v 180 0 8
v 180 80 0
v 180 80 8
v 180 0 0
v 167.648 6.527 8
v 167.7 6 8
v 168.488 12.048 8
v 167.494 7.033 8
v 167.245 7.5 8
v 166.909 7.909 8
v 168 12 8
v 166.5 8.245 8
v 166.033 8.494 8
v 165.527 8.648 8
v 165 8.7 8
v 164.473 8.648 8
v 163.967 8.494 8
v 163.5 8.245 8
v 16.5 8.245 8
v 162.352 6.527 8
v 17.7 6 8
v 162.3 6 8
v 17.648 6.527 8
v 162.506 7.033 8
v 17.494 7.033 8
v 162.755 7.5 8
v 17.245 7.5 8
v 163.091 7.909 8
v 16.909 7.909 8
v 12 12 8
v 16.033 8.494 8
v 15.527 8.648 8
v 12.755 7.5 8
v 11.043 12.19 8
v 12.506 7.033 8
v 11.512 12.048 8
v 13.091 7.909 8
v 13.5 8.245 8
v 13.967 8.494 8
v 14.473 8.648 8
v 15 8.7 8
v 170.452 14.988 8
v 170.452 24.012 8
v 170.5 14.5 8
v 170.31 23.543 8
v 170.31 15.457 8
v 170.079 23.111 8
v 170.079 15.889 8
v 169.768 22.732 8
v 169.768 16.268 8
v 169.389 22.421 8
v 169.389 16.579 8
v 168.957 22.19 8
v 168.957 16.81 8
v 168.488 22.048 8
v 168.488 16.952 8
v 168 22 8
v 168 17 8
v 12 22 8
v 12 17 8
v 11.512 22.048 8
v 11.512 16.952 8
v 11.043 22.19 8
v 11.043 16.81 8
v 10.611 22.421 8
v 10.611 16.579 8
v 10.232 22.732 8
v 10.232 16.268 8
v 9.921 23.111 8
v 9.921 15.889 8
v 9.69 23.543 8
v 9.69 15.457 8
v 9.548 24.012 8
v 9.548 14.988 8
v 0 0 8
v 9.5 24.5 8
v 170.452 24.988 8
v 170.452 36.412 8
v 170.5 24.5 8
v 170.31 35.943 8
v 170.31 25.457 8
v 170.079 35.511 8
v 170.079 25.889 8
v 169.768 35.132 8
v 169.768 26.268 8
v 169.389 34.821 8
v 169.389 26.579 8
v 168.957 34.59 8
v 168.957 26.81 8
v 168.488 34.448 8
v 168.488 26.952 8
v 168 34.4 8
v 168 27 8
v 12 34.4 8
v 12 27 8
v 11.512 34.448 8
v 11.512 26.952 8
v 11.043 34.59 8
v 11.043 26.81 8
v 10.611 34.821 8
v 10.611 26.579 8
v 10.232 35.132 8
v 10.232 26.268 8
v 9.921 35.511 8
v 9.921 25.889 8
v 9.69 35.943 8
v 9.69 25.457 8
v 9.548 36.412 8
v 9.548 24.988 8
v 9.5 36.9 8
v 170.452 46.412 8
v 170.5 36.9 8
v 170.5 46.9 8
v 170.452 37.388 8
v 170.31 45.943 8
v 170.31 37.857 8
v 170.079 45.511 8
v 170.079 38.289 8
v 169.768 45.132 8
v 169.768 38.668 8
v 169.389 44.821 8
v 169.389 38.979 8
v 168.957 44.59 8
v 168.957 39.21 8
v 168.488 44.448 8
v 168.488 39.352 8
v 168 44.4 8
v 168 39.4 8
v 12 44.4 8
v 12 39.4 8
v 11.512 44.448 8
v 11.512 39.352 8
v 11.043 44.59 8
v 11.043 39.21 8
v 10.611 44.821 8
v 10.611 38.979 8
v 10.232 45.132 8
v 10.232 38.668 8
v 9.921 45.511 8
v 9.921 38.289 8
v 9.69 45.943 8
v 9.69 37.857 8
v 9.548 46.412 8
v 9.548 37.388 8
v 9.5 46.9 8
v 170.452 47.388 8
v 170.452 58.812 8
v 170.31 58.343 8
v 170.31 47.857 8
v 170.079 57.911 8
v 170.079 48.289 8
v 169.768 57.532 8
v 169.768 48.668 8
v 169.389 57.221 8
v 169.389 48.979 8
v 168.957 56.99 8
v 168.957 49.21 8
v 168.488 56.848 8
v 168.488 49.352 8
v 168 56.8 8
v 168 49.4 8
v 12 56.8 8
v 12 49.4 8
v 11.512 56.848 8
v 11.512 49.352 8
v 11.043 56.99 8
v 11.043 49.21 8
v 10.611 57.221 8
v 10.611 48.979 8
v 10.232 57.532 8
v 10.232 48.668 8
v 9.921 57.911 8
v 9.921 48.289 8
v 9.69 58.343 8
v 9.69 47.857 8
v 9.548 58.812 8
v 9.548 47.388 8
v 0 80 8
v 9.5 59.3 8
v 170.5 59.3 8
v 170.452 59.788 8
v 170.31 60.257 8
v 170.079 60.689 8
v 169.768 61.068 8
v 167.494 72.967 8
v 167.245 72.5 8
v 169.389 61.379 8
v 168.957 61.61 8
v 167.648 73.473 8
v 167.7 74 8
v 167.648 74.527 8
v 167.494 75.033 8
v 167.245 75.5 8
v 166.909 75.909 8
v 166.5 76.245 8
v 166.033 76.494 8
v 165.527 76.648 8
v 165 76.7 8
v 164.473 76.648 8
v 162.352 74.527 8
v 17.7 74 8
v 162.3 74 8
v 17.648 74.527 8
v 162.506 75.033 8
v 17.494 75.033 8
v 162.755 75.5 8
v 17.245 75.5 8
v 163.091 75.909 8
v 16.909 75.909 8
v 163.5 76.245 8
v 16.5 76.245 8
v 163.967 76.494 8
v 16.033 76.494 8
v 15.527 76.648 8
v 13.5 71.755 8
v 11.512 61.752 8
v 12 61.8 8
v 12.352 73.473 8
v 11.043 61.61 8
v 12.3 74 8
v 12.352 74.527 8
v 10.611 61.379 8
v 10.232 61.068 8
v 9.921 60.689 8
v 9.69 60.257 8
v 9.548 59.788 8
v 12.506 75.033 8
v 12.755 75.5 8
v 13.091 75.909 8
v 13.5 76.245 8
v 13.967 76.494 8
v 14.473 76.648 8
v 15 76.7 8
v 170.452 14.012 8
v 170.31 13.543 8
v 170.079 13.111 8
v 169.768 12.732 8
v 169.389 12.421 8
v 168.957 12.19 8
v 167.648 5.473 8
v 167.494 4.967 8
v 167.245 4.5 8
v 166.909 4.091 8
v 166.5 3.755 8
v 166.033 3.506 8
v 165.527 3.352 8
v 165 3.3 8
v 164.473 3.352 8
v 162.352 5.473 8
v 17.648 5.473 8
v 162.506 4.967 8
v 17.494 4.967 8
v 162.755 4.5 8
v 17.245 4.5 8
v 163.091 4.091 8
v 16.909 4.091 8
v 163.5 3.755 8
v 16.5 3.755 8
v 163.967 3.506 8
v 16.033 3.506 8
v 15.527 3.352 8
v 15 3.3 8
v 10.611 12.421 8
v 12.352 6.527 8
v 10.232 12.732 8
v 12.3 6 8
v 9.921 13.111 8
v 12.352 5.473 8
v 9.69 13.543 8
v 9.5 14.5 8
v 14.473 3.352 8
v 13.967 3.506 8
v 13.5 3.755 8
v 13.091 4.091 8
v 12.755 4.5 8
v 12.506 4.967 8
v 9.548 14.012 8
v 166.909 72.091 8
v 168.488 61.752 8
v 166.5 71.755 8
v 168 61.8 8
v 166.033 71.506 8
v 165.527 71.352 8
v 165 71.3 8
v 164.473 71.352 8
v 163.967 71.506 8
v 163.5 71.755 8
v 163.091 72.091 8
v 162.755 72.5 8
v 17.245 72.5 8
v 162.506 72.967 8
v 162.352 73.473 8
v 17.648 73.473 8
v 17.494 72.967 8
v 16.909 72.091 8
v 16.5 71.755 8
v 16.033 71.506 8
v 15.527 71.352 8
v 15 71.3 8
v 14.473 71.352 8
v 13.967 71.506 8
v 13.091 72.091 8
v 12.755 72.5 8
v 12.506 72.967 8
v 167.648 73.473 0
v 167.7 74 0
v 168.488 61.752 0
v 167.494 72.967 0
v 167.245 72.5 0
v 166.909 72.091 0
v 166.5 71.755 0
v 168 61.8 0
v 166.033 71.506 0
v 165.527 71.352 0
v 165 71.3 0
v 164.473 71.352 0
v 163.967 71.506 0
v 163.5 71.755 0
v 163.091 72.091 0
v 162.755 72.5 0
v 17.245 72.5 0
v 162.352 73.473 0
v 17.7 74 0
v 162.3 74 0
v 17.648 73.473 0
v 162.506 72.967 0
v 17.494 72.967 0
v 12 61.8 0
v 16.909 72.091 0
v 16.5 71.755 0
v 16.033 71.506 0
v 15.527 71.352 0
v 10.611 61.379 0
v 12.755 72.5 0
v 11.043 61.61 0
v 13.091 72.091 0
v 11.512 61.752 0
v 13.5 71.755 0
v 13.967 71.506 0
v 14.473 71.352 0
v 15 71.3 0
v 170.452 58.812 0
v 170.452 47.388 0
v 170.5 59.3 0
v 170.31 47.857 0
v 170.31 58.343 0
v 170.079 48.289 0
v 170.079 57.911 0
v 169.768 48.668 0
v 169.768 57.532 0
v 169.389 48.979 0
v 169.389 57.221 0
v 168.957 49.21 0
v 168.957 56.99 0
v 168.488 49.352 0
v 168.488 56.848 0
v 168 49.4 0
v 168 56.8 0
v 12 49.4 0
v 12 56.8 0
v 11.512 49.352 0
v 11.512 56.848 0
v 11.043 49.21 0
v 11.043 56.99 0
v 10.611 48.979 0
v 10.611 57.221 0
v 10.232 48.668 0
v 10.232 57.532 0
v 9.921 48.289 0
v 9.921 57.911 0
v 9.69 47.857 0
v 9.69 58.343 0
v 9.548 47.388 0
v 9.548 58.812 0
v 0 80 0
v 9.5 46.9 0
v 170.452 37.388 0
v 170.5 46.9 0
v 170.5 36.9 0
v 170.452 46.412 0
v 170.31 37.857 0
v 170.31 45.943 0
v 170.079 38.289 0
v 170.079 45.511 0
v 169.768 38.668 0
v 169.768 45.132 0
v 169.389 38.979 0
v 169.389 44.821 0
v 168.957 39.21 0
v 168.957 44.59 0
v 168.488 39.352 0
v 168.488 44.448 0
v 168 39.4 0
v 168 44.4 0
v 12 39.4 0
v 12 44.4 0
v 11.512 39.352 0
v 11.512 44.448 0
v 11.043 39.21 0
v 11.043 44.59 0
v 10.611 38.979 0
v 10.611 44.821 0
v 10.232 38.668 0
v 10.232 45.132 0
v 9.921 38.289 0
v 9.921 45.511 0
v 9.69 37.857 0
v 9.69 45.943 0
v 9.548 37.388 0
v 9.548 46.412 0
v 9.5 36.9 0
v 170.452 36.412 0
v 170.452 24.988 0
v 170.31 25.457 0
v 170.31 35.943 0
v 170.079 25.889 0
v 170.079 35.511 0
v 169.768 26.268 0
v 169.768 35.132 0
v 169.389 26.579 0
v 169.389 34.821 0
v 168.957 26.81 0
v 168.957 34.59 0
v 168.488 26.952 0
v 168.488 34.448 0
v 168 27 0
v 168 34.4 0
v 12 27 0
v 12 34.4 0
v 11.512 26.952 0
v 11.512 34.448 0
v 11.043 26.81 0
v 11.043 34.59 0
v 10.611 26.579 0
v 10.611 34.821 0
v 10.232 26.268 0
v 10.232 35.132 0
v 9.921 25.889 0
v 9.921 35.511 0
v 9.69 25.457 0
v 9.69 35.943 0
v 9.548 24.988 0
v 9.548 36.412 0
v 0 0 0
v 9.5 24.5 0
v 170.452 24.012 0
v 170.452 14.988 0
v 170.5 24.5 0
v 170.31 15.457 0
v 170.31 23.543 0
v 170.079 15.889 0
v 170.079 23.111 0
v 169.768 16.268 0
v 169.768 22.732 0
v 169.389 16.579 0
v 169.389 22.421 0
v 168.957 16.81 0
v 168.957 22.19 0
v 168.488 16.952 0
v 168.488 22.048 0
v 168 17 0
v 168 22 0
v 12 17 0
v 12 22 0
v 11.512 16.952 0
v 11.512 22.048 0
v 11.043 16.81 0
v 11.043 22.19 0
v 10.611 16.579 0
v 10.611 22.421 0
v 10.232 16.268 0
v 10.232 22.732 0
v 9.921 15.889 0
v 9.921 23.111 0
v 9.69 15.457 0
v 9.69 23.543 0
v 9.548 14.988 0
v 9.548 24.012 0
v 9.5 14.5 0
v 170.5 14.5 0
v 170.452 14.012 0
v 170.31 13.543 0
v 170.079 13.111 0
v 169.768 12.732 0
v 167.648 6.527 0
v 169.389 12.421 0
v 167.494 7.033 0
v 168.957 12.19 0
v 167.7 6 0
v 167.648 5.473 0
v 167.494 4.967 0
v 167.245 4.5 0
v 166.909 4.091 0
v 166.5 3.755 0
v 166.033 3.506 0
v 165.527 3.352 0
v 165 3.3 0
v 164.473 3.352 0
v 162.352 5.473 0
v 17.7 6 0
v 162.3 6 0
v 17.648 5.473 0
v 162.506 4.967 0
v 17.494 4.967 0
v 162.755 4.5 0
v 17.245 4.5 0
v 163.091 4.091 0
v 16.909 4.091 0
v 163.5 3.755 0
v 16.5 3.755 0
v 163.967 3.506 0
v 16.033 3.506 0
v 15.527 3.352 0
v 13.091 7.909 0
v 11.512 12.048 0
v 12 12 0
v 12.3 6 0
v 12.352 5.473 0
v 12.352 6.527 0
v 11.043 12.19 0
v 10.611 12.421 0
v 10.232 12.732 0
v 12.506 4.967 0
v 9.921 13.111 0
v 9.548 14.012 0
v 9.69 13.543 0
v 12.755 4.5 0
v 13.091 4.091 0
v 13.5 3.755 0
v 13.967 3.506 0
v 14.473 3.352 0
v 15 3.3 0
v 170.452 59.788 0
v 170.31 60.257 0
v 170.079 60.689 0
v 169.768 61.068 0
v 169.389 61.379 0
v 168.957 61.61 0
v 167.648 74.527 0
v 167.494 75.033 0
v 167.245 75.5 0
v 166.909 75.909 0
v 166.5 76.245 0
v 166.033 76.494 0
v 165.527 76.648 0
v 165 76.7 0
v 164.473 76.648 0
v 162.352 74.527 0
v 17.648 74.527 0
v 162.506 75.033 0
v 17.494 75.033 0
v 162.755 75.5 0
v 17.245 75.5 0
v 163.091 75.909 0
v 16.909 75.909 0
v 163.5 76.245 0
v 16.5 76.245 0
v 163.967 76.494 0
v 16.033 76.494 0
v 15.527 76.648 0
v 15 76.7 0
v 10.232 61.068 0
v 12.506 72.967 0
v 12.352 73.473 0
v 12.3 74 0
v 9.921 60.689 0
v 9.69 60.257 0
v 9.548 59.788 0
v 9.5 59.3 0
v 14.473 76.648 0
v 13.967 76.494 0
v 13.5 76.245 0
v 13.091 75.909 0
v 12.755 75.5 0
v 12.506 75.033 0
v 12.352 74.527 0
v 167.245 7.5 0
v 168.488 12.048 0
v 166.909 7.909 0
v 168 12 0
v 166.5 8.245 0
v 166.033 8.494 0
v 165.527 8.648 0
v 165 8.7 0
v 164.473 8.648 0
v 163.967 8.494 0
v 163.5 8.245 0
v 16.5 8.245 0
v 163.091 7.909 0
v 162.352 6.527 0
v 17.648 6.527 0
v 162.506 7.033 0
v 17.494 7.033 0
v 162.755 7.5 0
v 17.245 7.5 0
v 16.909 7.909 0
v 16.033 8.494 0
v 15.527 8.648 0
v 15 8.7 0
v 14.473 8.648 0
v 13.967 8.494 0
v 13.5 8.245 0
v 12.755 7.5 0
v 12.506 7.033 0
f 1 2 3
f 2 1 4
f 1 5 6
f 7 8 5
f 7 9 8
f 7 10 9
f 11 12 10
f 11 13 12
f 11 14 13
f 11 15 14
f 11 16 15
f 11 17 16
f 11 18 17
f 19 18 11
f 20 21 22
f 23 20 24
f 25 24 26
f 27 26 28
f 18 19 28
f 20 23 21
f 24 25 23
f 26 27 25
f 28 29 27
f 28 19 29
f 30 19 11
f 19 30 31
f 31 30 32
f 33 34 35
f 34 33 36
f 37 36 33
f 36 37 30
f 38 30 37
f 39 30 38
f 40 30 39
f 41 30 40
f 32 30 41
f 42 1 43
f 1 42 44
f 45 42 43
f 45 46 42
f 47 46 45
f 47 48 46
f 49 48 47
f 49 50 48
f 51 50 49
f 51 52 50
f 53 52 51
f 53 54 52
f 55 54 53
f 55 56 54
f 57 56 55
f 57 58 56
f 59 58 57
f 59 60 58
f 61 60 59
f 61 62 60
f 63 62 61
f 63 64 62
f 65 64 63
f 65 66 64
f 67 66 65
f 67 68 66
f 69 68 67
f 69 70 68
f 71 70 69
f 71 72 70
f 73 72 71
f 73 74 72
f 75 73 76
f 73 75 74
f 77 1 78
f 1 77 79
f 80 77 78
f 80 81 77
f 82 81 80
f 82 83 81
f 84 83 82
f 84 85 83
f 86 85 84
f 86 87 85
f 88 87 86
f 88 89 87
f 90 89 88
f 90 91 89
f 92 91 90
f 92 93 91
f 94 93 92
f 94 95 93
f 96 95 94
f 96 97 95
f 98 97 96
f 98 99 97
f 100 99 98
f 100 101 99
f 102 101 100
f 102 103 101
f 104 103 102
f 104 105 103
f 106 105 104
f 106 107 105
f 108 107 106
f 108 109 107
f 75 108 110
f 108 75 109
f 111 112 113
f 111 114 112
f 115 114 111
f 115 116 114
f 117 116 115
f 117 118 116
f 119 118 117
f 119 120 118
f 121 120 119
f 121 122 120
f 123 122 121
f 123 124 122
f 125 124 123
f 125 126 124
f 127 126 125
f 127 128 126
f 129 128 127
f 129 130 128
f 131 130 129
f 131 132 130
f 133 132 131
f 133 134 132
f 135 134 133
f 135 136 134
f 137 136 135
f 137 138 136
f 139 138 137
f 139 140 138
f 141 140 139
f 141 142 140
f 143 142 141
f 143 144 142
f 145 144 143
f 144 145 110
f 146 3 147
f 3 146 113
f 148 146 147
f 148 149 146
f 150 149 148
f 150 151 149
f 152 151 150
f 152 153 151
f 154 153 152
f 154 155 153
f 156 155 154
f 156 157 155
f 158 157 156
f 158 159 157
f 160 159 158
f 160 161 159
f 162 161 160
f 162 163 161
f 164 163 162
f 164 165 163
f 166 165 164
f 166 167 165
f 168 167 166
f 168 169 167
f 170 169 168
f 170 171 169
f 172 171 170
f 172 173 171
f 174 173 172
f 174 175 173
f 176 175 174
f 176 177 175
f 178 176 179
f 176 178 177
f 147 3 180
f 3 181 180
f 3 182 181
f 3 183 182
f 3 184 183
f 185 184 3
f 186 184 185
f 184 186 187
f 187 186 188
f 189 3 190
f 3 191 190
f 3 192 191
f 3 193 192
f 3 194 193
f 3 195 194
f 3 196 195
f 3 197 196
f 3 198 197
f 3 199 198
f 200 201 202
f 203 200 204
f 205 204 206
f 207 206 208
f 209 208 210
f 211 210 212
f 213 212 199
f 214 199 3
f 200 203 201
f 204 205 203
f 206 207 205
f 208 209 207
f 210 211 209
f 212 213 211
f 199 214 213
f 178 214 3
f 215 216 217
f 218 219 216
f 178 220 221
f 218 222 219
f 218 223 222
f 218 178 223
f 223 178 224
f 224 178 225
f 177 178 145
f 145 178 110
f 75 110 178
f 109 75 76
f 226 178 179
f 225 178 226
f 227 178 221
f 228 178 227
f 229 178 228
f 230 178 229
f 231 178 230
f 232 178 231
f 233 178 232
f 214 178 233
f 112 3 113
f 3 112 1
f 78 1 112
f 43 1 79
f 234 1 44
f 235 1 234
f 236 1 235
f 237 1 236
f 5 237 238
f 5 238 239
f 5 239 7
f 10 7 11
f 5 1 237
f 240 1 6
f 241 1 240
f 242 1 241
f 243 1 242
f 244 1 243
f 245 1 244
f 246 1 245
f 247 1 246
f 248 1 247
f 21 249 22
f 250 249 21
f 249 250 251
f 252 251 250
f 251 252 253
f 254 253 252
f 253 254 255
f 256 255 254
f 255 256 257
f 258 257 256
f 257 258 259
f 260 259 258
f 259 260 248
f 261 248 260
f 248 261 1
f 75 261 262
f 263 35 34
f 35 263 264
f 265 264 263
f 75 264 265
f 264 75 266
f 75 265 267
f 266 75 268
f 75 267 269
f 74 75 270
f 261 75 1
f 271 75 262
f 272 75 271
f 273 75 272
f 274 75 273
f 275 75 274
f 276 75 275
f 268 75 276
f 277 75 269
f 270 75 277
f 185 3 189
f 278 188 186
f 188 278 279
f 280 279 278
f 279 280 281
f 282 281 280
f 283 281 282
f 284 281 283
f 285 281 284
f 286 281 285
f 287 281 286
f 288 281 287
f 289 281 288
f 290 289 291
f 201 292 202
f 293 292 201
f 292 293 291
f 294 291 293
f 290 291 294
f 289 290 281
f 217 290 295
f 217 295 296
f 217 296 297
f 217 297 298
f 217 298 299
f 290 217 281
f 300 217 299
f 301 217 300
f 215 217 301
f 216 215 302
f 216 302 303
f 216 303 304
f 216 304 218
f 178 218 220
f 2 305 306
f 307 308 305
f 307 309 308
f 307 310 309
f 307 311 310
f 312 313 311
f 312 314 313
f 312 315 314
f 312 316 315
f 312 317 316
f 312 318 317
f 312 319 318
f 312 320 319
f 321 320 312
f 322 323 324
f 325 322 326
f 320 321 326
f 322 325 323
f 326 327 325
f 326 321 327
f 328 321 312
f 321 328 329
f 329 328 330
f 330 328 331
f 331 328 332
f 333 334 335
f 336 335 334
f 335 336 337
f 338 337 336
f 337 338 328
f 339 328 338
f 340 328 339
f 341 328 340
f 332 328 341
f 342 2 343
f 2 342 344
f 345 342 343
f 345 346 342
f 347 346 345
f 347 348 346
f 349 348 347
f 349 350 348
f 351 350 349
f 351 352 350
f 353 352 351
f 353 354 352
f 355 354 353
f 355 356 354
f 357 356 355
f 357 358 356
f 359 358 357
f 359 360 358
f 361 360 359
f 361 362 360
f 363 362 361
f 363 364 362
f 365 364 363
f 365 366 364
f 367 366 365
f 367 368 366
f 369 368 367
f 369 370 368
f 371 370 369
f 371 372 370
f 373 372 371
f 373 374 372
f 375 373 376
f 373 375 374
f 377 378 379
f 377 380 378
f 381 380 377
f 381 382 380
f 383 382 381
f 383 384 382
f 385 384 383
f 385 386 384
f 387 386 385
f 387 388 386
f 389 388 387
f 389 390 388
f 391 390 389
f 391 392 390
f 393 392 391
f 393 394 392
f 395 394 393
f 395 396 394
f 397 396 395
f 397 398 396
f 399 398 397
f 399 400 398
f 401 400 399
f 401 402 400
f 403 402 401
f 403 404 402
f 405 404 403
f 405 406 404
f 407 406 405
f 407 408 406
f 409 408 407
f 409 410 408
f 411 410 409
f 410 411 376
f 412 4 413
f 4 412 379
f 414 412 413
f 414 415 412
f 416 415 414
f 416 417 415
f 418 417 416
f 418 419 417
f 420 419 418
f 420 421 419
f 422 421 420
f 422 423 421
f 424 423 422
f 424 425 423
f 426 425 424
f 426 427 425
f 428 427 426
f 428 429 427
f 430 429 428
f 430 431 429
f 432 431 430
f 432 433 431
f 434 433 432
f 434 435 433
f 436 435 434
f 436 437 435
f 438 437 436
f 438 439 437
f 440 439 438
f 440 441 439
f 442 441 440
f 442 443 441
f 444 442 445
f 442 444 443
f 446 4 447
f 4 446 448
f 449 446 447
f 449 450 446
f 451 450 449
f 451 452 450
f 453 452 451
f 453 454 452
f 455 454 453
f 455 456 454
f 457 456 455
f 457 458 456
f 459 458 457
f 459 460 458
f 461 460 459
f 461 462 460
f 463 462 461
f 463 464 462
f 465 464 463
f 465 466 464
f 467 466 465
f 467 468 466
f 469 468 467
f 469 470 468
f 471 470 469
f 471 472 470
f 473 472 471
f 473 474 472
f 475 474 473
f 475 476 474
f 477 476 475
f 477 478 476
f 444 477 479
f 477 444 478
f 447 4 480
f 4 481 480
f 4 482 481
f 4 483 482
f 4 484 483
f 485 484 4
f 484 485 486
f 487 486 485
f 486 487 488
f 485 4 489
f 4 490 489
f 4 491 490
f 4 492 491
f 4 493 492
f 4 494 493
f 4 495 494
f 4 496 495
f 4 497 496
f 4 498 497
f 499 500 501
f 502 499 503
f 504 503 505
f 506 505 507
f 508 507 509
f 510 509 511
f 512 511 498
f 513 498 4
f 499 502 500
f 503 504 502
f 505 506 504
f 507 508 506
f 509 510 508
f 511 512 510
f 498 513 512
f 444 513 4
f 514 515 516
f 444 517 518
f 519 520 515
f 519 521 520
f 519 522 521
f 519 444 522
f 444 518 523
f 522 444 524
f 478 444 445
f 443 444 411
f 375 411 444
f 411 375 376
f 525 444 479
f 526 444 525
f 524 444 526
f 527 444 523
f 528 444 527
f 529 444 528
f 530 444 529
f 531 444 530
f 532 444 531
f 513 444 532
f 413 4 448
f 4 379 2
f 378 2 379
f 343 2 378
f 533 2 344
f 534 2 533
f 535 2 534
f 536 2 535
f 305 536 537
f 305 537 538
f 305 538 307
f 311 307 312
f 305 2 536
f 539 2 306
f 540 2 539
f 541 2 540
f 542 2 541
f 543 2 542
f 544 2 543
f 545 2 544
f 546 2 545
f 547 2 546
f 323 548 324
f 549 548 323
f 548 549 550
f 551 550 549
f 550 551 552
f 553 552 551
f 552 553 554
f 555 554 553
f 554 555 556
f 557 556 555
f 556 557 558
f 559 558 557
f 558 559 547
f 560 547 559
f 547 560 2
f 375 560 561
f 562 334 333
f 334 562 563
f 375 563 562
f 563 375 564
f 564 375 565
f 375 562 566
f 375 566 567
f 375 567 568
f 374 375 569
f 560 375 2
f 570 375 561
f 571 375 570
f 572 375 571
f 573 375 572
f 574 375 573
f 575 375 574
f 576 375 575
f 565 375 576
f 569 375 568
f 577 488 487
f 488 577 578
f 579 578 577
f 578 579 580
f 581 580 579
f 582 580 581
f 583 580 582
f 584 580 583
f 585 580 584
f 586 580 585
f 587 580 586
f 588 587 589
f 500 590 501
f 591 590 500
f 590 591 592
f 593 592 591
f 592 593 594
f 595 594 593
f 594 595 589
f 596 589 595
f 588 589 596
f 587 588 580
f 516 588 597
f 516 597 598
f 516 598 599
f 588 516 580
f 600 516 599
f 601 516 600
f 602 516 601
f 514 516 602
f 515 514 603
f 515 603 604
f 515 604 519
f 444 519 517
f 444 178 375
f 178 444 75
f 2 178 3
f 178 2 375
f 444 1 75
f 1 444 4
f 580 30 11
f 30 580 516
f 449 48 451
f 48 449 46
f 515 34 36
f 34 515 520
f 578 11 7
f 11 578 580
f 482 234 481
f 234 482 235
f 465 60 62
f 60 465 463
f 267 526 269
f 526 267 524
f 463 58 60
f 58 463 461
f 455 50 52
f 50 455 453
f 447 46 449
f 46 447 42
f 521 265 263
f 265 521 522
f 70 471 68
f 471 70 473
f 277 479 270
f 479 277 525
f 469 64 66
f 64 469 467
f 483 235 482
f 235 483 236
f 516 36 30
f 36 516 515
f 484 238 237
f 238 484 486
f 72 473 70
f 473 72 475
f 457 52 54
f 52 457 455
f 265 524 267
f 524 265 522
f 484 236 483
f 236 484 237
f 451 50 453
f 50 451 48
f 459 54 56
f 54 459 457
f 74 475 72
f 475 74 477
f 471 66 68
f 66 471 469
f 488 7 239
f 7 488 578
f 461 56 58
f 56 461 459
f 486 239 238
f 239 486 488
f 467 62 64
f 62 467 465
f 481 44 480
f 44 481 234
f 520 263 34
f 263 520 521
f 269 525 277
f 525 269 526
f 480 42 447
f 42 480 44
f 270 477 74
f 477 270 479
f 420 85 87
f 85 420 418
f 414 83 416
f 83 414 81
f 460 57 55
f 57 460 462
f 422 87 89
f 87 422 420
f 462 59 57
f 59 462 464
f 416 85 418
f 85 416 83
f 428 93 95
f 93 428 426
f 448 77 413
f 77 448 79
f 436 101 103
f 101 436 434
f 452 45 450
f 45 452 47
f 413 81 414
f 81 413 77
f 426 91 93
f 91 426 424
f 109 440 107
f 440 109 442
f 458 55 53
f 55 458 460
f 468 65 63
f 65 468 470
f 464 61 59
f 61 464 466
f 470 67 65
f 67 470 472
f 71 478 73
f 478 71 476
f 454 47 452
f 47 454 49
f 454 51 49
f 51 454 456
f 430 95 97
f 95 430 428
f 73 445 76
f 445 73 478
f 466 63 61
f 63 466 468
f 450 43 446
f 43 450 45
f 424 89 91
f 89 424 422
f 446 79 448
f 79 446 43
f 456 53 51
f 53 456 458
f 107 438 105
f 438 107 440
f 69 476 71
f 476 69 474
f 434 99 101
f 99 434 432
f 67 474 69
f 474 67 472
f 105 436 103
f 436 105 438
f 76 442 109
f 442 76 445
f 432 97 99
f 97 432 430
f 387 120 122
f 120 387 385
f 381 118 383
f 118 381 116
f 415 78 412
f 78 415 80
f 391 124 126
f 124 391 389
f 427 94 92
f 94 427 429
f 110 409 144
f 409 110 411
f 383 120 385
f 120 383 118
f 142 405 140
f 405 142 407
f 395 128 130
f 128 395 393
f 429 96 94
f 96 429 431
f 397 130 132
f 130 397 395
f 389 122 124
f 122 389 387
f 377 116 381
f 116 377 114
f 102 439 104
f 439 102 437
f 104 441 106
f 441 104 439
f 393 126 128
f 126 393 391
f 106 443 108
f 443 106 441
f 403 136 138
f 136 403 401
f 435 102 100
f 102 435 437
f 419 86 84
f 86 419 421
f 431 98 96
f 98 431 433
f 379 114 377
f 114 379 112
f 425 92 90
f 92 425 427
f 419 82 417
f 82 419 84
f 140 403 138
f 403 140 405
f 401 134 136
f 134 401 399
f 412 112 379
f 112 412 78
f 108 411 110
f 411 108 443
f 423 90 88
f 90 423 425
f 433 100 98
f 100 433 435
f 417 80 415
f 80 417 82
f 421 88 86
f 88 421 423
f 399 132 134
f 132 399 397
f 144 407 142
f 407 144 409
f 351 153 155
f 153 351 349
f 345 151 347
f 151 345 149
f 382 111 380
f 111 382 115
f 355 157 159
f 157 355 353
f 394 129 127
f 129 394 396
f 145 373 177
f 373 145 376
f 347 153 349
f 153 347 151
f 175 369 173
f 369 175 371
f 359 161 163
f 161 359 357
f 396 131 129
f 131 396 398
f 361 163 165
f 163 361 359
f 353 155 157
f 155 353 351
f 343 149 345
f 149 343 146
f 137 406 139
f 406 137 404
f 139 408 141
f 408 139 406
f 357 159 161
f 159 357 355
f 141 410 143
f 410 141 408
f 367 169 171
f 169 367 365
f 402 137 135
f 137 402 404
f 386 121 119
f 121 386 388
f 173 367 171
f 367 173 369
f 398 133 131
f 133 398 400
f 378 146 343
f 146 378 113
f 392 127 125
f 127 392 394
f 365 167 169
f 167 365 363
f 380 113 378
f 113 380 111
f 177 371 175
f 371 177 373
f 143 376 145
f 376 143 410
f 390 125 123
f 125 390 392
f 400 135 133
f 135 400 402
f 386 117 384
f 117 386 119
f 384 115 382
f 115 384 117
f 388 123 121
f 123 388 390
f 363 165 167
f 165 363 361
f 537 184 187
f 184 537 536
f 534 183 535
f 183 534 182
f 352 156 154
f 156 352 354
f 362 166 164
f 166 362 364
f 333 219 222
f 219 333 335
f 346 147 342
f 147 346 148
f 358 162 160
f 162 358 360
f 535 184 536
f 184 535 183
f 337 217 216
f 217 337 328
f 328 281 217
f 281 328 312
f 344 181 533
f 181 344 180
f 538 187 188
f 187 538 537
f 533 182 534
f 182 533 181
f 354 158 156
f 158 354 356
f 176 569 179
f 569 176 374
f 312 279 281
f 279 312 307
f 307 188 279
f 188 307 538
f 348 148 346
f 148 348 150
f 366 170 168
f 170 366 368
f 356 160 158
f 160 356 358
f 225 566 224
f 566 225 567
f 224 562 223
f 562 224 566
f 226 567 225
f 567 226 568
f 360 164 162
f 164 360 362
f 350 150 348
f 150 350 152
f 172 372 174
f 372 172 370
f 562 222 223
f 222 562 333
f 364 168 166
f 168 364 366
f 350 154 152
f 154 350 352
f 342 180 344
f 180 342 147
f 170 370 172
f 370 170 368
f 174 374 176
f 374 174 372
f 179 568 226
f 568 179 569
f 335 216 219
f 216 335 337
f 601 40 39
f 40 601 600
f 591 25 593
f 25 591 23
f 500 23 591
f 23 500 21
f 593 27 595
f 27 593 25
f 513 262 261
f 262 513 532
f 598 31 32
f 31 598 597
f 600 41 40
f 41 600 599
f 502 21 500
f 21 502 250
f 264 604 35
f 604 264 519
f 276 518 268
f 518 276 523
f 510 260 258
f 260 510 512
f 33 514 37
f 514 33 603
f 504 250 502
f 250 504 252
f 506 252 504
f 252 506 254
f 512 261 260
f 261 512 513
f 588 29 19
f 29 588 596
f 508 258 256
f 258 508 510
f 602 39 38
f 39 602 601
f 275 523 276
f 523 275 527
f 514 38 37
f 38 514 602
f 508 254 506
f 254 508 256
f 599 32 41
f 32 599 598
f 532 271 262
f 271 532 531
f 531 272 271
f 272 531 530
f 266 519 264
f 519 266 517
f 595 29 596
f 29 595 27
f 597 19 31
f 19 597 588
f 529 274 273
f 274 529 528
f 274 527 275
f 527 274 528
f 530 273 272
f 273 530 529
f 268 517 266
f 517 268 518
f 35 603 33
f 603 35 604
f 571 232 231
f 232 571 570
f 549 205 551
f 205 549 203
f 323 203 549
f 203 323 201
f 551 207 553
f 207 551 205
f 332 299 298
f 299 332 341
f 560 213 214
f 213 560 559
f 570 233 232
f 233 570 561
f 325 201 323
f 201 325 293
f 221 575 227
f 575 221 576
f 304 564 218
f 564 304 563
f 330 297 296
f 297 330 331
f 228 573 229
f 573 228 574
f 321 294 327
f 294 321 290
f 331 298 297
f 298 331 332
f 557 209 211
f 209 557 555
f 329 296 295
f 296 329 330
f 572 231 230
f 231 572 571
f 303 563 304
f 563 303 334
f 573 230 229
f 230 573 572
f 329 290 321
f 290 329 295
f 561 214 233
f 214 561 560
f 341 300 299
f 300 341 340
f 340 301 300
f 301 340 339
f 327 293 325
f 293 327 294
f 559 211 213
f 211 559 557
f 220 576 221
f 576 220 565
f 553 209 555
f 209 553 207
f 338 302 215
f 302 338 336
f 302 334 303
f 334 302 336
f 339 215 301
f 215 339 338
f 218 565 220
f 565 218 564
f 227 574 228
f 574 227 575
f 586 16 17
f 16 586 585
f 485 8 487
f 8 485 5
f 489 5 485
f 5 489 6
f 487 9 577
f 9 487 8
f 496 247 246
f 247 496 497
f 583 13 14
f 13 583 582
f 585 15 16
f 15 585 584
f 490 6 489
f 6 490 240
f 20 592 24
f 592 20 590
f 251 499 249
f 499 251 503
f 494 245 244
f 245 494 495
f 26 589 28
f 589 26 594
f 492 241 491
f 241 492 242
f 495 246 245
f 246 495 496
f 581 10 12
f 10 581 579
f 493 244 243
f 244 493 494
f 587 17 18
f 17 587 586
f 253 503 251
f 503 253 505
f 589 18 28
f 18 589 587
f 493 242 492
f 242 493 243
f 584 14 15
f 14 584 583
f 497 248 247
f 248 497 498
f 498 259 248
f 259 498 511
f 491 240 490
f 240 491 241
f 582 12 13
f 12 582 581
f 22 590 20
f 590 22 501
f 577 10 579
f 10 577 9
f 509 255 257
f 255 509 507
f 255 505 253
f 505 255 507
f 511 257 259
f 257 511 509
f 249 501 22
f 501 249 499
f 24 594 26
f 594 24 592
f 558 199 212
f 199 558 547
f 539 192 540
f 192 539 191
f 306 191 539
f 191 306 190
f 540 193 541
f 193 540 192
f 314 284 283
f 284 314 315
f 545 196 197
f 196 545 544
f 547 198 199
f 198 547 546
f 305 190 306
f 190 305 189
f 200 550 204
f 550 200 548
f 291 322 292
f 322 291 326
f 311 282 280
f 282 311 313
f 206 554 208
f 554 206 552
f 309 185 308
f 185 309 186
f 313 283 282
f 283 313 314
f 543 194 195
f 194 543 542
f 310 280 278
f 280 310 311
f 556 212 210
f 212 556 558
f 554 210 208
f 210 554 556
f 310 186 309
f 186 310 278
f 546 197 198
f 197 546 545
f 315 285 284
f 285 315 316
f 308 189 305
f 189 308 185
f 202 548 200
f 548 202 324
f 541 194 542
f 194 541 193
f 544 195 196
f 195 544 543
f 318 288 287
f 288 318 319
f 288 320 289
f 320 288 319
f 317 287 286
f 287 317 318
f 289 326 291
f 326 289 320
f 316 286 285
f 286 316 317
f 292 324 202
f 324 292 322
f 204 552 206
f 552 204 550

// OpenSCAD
$fn = 32;

// ----------------------------------------------------------------------
// Slotted panel: 180 x 80 mm, 5 рядов of slots
// ----------------------------------------------------------------------

// --- parameters (mm) ---
panel_w = 180;            // panel width
panel_d = 80;             // panel depth
thick = 8;                // panel thickness
slot_w = 5;               // slot width
pitch0 = 10;              // first row pitch
pitch_step = 2.4;         // pitch increase per row
margin = 12;              // margin around the slot field
rows = 5;                 // number of slot rows
mount_d = 5.4;            // mounting holes
mount_x = 75;             // mounting hole offset

difference() {
  union() {
    cube([panel_w, panel_d, thick]);
  }
  /* slot rows: stadium shaped cutters, 2.5 mm clear of both faces */
  /* row 0: pitch 10, length 156 */
  hull() {
    translate([12, 14.5, -2.5]) cylinder(h = thick + 5, d = slot_w);
    translate([168, 14.5, -2.5]) cylinder(h = thick + 5, d = slot_w);
  }
  /* row 1: pitch 12.4, length 156 */
  hull() {
    translate([12, 24.5, -2.5]) cylinder(h = thick + 5, d = slot_w);
    translate([168, 24.5, -2.5]) cylinder(h = thick + 5, d = slot_w);
  }
  /* row 2: pitch 10, length 156 */
  hull() {
    translate([12, 36.9, -2.5]) cylinder(h = thick + 5, d = slot_w);
    translate([168, 36.9, -2.5]) cylinder(h = thick + 5, d = slot_w);
  }
  /* row 3: pitch 12.4, length 156 */
  hull() {
    translate([12, 46.9, -2.5]) cylinder(h = thick + 5, d = slot_w);
    translate([168, 46.9, -2.5]) cylinder(h = thick + 5, d = slot_w);
  }
  /* row 4: pitch 10, length 156 */
  hull() {
    translate([12, 59.3, -2.5]) cylinder(h = thick + 5, d = slot_w);
    translate([168, 59.3, -2.5]) cylinder(h = thick + 5, d = slot_w);
  }
  translate([15, 6, -2.5]) cylinder(h = 13, d = mount_d);
  translate([15, 74, -2.5]) cylinder(h = 13, d = mount_d);
  translate([165, 6, -2.5]) cylinder(h = 13, d = mount_d);
  translate([165, 74, -2.5]) cylinder(h = 13, d = mount_d);
}
